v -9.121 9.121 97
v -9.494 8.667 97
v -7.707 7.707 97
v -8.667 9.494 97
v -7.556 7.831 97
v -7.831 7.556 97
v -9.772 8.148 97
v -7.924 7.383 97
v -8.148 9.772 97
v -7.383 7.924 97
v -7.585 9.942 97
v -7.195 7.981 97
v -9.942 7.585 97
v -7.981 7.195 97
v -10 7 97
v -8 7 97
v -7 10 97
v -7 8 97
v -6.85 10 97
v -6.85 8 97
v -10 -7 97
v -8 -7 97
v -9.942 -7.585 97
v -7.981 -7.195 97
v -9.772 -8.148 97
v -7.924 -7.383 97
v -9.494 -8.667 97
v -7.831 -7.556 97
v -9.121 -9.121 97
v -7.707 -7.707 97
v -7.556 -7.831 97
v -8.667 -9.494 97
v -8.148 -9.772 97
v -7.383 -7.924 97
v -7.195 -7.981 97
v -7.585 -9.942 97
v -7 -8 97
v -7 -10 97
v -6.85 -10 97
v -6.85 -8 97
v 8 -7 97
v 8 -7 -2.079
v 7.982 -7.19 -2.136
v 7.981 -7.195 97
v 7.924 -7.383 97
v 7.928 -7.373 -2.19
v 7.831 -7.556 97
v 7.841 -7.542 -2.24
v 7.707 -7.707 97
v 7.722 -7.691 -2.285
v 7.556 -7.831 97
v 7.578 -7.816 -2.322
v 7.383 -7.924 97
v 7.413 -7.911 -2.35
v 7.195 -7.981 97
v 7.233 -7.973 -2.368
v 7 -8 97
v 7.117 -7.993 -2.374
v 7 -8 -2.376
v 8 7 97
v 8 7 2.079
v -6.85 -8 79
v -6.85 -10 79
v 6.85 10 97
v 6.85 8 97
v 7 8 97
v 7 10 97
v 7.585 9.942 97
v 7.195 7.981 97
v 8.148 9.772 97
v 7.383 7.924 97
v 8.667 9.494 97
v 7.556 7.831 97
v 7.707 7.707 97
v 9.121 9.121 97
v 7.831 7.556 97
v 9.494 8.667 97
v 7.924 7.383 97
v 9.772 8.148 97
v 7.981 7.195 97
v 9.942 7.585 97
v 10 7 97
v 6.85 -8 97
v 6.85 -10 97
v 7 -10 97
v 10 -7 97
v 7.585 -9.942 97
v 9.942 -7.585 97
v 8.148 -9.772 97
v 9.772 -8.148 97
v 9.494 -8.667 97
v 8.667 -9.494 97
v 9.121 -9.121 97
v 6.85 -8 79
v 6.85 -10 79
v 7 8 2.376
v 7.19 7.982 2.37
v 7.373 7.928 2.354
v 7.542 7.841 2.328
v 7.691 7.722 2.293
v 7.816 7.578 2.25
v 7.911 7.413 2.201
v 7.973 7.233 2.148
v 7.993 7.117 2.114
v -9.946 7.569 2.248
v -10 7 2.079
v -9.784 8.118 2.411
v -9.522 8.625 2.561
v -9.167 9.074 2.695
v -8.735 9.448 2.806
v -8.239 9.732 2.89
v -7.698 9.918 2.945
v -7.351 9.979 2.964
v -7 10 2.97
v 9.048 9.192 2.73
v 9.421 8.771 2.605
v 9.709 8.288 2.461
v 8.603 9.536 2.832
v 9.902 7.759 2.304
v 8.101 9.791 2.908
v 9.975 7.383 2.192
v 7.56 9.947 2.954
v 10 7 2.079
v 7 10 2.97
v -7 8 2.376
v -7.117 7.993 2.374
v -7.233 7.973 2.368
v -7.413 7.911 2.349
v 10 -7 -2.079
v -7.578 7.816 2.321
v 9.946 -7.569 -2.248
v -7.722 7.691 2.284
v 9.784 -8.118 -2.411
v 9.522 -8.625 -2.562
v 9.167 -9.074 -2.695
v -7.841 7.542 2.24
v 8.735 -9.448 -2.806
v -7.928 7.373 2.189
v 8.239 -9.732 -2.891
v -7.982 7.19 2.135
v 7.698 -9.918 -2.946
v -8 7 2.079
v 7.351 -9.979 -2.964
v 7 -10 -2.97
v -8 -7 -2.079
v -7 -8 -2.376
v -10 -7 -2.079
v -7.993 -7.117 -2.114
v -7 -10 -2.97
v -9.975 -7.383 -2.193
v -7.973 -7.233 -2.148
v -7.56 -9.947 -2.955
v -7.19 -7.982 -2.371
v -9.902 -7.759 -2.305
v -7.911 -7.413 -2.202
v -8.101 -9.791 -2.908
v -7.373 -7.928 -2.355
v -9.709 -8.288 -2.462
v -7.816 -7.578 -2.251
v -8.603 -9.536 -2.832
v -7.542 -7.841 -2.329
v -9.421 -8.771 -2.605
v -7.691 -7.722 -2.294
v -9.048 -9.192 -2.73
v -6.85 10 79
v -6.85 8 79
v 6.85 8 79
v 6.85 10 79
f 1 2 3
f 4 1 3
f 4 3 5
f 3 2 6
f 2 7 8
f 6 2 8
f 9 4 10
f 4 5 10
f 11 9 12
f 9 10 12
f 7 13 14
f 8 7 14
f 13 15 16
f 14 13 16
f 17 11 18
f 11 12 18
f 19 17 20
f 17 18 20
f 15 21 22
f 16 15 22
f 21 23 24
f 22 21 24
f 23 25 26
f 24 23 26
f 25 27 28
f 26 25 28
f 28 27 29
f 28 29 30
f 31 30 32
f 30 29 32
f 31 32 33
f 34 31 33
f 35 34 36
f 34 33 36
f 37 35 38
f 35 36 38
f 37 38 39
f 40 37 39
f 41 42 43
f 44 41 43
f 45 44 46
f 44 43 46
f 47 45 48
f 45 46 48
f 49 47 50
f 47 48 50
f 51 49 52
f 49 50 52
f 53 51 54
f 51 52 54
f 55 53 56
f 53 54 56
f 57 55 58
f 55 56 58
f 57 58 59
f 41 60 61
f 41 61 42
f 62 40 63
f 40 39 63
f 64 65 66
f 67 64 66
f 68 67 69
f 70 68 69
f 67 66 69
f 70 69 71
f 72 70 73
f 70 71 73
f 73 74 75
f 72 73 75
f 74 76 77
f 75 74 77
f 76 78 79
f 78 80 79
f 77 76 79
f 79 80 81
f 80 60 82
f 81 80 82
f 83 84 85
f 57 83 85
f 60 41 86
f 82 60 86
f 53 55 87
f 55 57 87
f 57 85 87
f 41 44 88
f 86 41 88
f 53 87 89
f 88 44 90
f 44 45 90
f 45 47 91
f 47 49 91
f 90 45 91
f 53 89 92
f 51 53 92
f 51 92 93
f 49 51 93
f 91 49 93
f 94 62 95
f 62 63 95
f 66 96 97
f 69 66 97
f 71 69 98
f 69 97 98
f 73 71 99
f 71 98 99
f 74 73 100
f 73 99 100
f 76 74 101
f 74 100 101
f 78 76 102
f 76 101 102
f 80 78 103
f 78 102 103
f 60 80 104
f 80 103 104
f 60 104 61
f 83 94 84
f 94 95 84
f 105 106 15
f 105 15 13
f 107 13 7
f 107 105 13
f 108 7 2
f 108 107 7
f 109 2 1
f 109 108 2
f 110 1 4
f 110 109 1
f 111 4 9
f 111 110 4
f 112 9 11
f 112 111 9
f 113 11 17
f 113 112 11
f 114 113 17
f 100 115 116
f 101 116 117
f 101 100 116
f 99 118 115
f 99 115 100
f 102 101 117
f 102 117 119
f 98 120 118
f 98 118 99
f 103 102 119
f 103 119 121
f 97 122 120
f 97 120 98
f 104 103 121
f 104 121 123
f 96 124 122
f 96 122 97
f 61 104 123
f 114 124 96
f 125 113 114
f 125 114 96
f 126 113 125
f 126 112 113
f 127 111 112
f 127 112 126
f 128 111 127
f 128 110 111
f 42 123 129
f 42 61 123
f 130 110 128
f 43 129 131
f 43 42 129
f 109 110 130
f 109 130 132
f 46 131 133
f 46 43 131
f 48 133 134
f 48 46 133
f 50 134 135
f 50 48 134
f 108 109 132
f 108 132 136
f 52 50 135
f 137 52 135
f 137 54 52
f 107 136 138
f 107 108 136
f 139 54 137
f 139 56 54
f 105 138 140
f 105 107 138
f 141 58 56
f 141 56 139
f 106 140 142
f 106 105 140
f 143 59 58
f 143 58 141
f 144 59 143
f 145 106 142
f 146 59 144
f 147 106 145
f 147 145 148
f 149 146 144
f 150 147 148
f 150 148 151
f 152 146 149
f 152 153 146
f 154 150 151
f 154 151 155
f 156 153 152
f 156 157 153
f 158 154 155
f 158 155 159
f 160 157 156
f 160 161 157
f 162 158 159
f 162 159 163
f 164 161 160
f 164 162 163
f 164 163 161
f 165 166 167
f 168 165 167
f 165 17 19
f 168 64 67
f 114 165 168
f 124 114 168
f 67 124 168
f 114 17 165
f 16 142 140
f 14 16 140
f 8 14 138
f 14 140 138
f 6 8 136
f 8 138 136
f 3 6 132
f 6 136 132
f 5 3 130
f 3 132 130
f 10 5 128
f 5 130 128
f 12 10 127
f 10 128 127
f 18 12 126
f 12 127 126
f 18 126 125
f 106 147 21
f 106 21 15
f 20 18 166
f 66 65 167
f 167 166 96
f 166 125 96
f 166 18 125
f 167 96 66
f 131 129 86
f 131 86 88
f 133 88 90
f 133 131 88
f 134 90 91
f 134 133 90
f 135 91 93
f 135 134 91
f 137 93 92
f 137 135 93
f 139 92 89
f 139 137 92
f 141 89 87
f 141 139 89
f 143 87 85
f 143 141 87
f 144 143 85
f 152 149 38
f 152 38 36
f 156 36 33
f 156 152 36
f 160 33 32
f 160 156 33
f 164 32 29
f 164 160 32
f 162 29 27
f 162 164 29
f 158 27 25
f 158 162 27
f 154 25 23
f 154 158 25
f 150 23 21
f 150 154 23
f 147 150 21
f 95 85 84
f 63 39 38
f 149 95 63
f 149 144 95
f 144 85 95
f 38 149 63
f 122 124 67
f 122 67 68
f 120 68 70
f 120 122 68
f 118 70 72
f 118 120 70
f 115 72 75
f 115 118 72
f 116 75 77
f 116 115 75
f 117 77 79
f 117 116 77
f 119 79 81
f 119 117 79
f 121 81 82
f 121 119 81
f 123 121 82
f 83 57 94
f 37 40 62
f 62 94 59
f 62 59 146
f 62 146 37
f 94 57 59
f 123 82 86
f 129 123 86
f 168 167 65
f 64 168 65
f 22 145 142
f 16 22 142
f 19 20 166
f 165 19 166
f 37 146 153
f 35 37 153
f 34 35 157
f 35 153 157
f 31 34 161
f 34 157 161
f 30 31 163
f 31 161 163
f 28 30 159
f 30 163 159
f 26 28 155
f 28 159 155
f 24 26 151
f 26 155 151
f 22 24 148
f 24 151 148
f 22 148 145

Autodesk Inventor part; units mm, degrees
ref_plane "Start Plane" through (0, 0, -2.9702) normal (0, 0, 1) x (1, 0, 0)
ref_plane "End Plane" through (0, 0, 105) normal (0, 0, 1) x (1, 0, 0)
sketch "Sketch" plane through (0, 0, 0) normal (0, 0, 1) x (1, 0, 0)
  line L0 (-10, -7) -> (-10, 7)
  line L1 (-7, 10) -> (7, 10)
  line L2 (10, 7) -> (10, -7)
  line L3 (7, -10) -> (-7, -10)
  arc A0 (-10, -7) -> (-7, -10) centre (-7, -7) ccw
  arc A1 (-7, 10) -> (-10, 7) centre (-7, 7) ccw
  arc A2 (10, 7) -> (7, 10) centre (7, 7) ccw
  arc A3 (7, -10) -> (10, -7) centre (7, -7) ccw
  arc A4 (-7, 8) -> (-8, 7) centre (-7, 7) ccw
  line L4 (-7, 8) -> (7, 8)
  arc A5 (8, 7) -> (7, 8) centre (7, 7) ccw
  line L5 (8, 7) -> (8, -7)
  arc A6 (7, -8) -> (8, -7) centre (7, -7) ccw
  line L6 (7, -8) -> (-7, -8)
  arc A7 (-8, -7) -> (-7, -8) centre (-7, -7) ccw
  line L7 (-8, -7) -> (-8, 7)
  line L8 (0, 14.8698) -> (0, -14.8698) construction
  line L9 (-14.8698, 0) -> (14.8698, 0) construction
  dimension "d7" = 3
  dimension "d10" = 20
  dimension "d11" = 20
  dimension "d12" = 2
  dimension "d15" = 10
  dimension "d16" = 10
extrude "Body" add sketch "Sketch" along normal up to surface (107.9702 mm away) from surface at -2.9702
sketch "Sketch3" plane through (0, 0, 0) normal (0, 0, 1) x (1, 0, 0)
  line L0 (0, 0) -> (10, 0)
ref_plane "Work Plane3" through (0, 0, 0) normal (0, -1, 0) x (1, 0, 0)
sketch "Sketch4" plane through (0, 0, 0) normal (0, -1, 0) x (1, 0, 0)
  line L0 (-2, -2.9702) -> (12, -2.9702)
  line L1 (-2, 105) -> (12, 105)
  dimension "d18" = 107.9702
ref_plane "Work Plane4" through (0, -10, -2.9702) normal (0, 0.2847, -0.9586) x (1, 0, 0)
split "Split1" plane through (0, -10, -2.9702) removes the side toward (0, 0.2847, -0.9586)
sketch "Sketch5" plane through (-7, -10, 105) normal (0, -1, 0) x (1, 0, 0)
  line L0 (0, 0) -> (14, 0)
  line L1 (7, 0) -> (7, -18) construction
  line L2 (13.85, 0) -> (0.15, 0)
  line L3 (0.15, 0) -> (0.15, -18)
  line L4 (0.15, -18) -> (13.85, -18)
  line L5 (13.85, -18) -> (13.85, 0)
  line L6 (14, 0) -> (0, 0) projected
  line L7 (13.85, -8) -> (0.15, -8)
  line L8 (0.15, -8) -> (0.15, -26)
  line L9 (0.15, -26) -> (13.85, -26)
  line L10 (13.85, -26) -> (13.85, -8)
  line L11 (13.85, -8) -> (0.15, -26) construction
  line L12 (0.15, -8) -> (13.85, -26) construction
  line L13 (13.85, -8) -> (17, -8)
  line L14 (17, 0) -> (17, -102.9209) projected
  line L15 (17, -8) -> (17, 0)
  line L16 (17, 0) -> (13.85, 0)
  line L17 (-3, 0) -> (0, 0) projected
  line L18 (0.15, 0) -> (-3, 0)
  line L19 (-3, 0) -> (-3, -8)
  line L20 (-3, -8) -> (0.15, -8)
  point P0 (7, -105)
  point P1 (7, 0)
  point P2 (13.85, 0)
  point P3 (0.15, 0)
  point P4 (7, -17)
  point P5 (13.85, -18)
  point P6 (0.15, -18)
  point P7 (13.85, -8)
  point P8 (17, -8)
  point P9 (0.15, -8)
  dimension "d19" = 13.7
  dimension "d20" = 18
  dimension "d23" = 13.7
  dimension "d24" = 18
  dimension "d25" = 8
extrude "Extrusion2" cut sketch "Sketch5" against normal through all
equation "\"d7\" = G_IR"
equation "\"d10\" = G_H"
equation "\"d11\" = G_W"
equation "\"d12\" = G_T"
equation "\"d15\" = 0.5 * d10"
equation "\"d16\" = 0.5 * d11"
equation "\"d3\" = G_L"
equation "\"d23\" = d19"
equation "\"d24\" = d20"
equation "\"G_W\" = 20"
equation "\"G_H\" = 20"
equation "\"G_T\" = 2"
equation "\"G_IR\" = 3"
equation "\"G_L\" = d18"
equation "\"G_OFFSET_START\" = 2.97016"
equation "\"G_OFFSET_END\" = 0"
equation "\"d13\" = -G_OFFSET_START"
equation "\"d14\" = G_OFFSET_END + B_L"
equation "\"B_L\" = 105"
properties part number "ISO 12633-2 - 20x20x2 - 107,97" material "Steel, Mild"
